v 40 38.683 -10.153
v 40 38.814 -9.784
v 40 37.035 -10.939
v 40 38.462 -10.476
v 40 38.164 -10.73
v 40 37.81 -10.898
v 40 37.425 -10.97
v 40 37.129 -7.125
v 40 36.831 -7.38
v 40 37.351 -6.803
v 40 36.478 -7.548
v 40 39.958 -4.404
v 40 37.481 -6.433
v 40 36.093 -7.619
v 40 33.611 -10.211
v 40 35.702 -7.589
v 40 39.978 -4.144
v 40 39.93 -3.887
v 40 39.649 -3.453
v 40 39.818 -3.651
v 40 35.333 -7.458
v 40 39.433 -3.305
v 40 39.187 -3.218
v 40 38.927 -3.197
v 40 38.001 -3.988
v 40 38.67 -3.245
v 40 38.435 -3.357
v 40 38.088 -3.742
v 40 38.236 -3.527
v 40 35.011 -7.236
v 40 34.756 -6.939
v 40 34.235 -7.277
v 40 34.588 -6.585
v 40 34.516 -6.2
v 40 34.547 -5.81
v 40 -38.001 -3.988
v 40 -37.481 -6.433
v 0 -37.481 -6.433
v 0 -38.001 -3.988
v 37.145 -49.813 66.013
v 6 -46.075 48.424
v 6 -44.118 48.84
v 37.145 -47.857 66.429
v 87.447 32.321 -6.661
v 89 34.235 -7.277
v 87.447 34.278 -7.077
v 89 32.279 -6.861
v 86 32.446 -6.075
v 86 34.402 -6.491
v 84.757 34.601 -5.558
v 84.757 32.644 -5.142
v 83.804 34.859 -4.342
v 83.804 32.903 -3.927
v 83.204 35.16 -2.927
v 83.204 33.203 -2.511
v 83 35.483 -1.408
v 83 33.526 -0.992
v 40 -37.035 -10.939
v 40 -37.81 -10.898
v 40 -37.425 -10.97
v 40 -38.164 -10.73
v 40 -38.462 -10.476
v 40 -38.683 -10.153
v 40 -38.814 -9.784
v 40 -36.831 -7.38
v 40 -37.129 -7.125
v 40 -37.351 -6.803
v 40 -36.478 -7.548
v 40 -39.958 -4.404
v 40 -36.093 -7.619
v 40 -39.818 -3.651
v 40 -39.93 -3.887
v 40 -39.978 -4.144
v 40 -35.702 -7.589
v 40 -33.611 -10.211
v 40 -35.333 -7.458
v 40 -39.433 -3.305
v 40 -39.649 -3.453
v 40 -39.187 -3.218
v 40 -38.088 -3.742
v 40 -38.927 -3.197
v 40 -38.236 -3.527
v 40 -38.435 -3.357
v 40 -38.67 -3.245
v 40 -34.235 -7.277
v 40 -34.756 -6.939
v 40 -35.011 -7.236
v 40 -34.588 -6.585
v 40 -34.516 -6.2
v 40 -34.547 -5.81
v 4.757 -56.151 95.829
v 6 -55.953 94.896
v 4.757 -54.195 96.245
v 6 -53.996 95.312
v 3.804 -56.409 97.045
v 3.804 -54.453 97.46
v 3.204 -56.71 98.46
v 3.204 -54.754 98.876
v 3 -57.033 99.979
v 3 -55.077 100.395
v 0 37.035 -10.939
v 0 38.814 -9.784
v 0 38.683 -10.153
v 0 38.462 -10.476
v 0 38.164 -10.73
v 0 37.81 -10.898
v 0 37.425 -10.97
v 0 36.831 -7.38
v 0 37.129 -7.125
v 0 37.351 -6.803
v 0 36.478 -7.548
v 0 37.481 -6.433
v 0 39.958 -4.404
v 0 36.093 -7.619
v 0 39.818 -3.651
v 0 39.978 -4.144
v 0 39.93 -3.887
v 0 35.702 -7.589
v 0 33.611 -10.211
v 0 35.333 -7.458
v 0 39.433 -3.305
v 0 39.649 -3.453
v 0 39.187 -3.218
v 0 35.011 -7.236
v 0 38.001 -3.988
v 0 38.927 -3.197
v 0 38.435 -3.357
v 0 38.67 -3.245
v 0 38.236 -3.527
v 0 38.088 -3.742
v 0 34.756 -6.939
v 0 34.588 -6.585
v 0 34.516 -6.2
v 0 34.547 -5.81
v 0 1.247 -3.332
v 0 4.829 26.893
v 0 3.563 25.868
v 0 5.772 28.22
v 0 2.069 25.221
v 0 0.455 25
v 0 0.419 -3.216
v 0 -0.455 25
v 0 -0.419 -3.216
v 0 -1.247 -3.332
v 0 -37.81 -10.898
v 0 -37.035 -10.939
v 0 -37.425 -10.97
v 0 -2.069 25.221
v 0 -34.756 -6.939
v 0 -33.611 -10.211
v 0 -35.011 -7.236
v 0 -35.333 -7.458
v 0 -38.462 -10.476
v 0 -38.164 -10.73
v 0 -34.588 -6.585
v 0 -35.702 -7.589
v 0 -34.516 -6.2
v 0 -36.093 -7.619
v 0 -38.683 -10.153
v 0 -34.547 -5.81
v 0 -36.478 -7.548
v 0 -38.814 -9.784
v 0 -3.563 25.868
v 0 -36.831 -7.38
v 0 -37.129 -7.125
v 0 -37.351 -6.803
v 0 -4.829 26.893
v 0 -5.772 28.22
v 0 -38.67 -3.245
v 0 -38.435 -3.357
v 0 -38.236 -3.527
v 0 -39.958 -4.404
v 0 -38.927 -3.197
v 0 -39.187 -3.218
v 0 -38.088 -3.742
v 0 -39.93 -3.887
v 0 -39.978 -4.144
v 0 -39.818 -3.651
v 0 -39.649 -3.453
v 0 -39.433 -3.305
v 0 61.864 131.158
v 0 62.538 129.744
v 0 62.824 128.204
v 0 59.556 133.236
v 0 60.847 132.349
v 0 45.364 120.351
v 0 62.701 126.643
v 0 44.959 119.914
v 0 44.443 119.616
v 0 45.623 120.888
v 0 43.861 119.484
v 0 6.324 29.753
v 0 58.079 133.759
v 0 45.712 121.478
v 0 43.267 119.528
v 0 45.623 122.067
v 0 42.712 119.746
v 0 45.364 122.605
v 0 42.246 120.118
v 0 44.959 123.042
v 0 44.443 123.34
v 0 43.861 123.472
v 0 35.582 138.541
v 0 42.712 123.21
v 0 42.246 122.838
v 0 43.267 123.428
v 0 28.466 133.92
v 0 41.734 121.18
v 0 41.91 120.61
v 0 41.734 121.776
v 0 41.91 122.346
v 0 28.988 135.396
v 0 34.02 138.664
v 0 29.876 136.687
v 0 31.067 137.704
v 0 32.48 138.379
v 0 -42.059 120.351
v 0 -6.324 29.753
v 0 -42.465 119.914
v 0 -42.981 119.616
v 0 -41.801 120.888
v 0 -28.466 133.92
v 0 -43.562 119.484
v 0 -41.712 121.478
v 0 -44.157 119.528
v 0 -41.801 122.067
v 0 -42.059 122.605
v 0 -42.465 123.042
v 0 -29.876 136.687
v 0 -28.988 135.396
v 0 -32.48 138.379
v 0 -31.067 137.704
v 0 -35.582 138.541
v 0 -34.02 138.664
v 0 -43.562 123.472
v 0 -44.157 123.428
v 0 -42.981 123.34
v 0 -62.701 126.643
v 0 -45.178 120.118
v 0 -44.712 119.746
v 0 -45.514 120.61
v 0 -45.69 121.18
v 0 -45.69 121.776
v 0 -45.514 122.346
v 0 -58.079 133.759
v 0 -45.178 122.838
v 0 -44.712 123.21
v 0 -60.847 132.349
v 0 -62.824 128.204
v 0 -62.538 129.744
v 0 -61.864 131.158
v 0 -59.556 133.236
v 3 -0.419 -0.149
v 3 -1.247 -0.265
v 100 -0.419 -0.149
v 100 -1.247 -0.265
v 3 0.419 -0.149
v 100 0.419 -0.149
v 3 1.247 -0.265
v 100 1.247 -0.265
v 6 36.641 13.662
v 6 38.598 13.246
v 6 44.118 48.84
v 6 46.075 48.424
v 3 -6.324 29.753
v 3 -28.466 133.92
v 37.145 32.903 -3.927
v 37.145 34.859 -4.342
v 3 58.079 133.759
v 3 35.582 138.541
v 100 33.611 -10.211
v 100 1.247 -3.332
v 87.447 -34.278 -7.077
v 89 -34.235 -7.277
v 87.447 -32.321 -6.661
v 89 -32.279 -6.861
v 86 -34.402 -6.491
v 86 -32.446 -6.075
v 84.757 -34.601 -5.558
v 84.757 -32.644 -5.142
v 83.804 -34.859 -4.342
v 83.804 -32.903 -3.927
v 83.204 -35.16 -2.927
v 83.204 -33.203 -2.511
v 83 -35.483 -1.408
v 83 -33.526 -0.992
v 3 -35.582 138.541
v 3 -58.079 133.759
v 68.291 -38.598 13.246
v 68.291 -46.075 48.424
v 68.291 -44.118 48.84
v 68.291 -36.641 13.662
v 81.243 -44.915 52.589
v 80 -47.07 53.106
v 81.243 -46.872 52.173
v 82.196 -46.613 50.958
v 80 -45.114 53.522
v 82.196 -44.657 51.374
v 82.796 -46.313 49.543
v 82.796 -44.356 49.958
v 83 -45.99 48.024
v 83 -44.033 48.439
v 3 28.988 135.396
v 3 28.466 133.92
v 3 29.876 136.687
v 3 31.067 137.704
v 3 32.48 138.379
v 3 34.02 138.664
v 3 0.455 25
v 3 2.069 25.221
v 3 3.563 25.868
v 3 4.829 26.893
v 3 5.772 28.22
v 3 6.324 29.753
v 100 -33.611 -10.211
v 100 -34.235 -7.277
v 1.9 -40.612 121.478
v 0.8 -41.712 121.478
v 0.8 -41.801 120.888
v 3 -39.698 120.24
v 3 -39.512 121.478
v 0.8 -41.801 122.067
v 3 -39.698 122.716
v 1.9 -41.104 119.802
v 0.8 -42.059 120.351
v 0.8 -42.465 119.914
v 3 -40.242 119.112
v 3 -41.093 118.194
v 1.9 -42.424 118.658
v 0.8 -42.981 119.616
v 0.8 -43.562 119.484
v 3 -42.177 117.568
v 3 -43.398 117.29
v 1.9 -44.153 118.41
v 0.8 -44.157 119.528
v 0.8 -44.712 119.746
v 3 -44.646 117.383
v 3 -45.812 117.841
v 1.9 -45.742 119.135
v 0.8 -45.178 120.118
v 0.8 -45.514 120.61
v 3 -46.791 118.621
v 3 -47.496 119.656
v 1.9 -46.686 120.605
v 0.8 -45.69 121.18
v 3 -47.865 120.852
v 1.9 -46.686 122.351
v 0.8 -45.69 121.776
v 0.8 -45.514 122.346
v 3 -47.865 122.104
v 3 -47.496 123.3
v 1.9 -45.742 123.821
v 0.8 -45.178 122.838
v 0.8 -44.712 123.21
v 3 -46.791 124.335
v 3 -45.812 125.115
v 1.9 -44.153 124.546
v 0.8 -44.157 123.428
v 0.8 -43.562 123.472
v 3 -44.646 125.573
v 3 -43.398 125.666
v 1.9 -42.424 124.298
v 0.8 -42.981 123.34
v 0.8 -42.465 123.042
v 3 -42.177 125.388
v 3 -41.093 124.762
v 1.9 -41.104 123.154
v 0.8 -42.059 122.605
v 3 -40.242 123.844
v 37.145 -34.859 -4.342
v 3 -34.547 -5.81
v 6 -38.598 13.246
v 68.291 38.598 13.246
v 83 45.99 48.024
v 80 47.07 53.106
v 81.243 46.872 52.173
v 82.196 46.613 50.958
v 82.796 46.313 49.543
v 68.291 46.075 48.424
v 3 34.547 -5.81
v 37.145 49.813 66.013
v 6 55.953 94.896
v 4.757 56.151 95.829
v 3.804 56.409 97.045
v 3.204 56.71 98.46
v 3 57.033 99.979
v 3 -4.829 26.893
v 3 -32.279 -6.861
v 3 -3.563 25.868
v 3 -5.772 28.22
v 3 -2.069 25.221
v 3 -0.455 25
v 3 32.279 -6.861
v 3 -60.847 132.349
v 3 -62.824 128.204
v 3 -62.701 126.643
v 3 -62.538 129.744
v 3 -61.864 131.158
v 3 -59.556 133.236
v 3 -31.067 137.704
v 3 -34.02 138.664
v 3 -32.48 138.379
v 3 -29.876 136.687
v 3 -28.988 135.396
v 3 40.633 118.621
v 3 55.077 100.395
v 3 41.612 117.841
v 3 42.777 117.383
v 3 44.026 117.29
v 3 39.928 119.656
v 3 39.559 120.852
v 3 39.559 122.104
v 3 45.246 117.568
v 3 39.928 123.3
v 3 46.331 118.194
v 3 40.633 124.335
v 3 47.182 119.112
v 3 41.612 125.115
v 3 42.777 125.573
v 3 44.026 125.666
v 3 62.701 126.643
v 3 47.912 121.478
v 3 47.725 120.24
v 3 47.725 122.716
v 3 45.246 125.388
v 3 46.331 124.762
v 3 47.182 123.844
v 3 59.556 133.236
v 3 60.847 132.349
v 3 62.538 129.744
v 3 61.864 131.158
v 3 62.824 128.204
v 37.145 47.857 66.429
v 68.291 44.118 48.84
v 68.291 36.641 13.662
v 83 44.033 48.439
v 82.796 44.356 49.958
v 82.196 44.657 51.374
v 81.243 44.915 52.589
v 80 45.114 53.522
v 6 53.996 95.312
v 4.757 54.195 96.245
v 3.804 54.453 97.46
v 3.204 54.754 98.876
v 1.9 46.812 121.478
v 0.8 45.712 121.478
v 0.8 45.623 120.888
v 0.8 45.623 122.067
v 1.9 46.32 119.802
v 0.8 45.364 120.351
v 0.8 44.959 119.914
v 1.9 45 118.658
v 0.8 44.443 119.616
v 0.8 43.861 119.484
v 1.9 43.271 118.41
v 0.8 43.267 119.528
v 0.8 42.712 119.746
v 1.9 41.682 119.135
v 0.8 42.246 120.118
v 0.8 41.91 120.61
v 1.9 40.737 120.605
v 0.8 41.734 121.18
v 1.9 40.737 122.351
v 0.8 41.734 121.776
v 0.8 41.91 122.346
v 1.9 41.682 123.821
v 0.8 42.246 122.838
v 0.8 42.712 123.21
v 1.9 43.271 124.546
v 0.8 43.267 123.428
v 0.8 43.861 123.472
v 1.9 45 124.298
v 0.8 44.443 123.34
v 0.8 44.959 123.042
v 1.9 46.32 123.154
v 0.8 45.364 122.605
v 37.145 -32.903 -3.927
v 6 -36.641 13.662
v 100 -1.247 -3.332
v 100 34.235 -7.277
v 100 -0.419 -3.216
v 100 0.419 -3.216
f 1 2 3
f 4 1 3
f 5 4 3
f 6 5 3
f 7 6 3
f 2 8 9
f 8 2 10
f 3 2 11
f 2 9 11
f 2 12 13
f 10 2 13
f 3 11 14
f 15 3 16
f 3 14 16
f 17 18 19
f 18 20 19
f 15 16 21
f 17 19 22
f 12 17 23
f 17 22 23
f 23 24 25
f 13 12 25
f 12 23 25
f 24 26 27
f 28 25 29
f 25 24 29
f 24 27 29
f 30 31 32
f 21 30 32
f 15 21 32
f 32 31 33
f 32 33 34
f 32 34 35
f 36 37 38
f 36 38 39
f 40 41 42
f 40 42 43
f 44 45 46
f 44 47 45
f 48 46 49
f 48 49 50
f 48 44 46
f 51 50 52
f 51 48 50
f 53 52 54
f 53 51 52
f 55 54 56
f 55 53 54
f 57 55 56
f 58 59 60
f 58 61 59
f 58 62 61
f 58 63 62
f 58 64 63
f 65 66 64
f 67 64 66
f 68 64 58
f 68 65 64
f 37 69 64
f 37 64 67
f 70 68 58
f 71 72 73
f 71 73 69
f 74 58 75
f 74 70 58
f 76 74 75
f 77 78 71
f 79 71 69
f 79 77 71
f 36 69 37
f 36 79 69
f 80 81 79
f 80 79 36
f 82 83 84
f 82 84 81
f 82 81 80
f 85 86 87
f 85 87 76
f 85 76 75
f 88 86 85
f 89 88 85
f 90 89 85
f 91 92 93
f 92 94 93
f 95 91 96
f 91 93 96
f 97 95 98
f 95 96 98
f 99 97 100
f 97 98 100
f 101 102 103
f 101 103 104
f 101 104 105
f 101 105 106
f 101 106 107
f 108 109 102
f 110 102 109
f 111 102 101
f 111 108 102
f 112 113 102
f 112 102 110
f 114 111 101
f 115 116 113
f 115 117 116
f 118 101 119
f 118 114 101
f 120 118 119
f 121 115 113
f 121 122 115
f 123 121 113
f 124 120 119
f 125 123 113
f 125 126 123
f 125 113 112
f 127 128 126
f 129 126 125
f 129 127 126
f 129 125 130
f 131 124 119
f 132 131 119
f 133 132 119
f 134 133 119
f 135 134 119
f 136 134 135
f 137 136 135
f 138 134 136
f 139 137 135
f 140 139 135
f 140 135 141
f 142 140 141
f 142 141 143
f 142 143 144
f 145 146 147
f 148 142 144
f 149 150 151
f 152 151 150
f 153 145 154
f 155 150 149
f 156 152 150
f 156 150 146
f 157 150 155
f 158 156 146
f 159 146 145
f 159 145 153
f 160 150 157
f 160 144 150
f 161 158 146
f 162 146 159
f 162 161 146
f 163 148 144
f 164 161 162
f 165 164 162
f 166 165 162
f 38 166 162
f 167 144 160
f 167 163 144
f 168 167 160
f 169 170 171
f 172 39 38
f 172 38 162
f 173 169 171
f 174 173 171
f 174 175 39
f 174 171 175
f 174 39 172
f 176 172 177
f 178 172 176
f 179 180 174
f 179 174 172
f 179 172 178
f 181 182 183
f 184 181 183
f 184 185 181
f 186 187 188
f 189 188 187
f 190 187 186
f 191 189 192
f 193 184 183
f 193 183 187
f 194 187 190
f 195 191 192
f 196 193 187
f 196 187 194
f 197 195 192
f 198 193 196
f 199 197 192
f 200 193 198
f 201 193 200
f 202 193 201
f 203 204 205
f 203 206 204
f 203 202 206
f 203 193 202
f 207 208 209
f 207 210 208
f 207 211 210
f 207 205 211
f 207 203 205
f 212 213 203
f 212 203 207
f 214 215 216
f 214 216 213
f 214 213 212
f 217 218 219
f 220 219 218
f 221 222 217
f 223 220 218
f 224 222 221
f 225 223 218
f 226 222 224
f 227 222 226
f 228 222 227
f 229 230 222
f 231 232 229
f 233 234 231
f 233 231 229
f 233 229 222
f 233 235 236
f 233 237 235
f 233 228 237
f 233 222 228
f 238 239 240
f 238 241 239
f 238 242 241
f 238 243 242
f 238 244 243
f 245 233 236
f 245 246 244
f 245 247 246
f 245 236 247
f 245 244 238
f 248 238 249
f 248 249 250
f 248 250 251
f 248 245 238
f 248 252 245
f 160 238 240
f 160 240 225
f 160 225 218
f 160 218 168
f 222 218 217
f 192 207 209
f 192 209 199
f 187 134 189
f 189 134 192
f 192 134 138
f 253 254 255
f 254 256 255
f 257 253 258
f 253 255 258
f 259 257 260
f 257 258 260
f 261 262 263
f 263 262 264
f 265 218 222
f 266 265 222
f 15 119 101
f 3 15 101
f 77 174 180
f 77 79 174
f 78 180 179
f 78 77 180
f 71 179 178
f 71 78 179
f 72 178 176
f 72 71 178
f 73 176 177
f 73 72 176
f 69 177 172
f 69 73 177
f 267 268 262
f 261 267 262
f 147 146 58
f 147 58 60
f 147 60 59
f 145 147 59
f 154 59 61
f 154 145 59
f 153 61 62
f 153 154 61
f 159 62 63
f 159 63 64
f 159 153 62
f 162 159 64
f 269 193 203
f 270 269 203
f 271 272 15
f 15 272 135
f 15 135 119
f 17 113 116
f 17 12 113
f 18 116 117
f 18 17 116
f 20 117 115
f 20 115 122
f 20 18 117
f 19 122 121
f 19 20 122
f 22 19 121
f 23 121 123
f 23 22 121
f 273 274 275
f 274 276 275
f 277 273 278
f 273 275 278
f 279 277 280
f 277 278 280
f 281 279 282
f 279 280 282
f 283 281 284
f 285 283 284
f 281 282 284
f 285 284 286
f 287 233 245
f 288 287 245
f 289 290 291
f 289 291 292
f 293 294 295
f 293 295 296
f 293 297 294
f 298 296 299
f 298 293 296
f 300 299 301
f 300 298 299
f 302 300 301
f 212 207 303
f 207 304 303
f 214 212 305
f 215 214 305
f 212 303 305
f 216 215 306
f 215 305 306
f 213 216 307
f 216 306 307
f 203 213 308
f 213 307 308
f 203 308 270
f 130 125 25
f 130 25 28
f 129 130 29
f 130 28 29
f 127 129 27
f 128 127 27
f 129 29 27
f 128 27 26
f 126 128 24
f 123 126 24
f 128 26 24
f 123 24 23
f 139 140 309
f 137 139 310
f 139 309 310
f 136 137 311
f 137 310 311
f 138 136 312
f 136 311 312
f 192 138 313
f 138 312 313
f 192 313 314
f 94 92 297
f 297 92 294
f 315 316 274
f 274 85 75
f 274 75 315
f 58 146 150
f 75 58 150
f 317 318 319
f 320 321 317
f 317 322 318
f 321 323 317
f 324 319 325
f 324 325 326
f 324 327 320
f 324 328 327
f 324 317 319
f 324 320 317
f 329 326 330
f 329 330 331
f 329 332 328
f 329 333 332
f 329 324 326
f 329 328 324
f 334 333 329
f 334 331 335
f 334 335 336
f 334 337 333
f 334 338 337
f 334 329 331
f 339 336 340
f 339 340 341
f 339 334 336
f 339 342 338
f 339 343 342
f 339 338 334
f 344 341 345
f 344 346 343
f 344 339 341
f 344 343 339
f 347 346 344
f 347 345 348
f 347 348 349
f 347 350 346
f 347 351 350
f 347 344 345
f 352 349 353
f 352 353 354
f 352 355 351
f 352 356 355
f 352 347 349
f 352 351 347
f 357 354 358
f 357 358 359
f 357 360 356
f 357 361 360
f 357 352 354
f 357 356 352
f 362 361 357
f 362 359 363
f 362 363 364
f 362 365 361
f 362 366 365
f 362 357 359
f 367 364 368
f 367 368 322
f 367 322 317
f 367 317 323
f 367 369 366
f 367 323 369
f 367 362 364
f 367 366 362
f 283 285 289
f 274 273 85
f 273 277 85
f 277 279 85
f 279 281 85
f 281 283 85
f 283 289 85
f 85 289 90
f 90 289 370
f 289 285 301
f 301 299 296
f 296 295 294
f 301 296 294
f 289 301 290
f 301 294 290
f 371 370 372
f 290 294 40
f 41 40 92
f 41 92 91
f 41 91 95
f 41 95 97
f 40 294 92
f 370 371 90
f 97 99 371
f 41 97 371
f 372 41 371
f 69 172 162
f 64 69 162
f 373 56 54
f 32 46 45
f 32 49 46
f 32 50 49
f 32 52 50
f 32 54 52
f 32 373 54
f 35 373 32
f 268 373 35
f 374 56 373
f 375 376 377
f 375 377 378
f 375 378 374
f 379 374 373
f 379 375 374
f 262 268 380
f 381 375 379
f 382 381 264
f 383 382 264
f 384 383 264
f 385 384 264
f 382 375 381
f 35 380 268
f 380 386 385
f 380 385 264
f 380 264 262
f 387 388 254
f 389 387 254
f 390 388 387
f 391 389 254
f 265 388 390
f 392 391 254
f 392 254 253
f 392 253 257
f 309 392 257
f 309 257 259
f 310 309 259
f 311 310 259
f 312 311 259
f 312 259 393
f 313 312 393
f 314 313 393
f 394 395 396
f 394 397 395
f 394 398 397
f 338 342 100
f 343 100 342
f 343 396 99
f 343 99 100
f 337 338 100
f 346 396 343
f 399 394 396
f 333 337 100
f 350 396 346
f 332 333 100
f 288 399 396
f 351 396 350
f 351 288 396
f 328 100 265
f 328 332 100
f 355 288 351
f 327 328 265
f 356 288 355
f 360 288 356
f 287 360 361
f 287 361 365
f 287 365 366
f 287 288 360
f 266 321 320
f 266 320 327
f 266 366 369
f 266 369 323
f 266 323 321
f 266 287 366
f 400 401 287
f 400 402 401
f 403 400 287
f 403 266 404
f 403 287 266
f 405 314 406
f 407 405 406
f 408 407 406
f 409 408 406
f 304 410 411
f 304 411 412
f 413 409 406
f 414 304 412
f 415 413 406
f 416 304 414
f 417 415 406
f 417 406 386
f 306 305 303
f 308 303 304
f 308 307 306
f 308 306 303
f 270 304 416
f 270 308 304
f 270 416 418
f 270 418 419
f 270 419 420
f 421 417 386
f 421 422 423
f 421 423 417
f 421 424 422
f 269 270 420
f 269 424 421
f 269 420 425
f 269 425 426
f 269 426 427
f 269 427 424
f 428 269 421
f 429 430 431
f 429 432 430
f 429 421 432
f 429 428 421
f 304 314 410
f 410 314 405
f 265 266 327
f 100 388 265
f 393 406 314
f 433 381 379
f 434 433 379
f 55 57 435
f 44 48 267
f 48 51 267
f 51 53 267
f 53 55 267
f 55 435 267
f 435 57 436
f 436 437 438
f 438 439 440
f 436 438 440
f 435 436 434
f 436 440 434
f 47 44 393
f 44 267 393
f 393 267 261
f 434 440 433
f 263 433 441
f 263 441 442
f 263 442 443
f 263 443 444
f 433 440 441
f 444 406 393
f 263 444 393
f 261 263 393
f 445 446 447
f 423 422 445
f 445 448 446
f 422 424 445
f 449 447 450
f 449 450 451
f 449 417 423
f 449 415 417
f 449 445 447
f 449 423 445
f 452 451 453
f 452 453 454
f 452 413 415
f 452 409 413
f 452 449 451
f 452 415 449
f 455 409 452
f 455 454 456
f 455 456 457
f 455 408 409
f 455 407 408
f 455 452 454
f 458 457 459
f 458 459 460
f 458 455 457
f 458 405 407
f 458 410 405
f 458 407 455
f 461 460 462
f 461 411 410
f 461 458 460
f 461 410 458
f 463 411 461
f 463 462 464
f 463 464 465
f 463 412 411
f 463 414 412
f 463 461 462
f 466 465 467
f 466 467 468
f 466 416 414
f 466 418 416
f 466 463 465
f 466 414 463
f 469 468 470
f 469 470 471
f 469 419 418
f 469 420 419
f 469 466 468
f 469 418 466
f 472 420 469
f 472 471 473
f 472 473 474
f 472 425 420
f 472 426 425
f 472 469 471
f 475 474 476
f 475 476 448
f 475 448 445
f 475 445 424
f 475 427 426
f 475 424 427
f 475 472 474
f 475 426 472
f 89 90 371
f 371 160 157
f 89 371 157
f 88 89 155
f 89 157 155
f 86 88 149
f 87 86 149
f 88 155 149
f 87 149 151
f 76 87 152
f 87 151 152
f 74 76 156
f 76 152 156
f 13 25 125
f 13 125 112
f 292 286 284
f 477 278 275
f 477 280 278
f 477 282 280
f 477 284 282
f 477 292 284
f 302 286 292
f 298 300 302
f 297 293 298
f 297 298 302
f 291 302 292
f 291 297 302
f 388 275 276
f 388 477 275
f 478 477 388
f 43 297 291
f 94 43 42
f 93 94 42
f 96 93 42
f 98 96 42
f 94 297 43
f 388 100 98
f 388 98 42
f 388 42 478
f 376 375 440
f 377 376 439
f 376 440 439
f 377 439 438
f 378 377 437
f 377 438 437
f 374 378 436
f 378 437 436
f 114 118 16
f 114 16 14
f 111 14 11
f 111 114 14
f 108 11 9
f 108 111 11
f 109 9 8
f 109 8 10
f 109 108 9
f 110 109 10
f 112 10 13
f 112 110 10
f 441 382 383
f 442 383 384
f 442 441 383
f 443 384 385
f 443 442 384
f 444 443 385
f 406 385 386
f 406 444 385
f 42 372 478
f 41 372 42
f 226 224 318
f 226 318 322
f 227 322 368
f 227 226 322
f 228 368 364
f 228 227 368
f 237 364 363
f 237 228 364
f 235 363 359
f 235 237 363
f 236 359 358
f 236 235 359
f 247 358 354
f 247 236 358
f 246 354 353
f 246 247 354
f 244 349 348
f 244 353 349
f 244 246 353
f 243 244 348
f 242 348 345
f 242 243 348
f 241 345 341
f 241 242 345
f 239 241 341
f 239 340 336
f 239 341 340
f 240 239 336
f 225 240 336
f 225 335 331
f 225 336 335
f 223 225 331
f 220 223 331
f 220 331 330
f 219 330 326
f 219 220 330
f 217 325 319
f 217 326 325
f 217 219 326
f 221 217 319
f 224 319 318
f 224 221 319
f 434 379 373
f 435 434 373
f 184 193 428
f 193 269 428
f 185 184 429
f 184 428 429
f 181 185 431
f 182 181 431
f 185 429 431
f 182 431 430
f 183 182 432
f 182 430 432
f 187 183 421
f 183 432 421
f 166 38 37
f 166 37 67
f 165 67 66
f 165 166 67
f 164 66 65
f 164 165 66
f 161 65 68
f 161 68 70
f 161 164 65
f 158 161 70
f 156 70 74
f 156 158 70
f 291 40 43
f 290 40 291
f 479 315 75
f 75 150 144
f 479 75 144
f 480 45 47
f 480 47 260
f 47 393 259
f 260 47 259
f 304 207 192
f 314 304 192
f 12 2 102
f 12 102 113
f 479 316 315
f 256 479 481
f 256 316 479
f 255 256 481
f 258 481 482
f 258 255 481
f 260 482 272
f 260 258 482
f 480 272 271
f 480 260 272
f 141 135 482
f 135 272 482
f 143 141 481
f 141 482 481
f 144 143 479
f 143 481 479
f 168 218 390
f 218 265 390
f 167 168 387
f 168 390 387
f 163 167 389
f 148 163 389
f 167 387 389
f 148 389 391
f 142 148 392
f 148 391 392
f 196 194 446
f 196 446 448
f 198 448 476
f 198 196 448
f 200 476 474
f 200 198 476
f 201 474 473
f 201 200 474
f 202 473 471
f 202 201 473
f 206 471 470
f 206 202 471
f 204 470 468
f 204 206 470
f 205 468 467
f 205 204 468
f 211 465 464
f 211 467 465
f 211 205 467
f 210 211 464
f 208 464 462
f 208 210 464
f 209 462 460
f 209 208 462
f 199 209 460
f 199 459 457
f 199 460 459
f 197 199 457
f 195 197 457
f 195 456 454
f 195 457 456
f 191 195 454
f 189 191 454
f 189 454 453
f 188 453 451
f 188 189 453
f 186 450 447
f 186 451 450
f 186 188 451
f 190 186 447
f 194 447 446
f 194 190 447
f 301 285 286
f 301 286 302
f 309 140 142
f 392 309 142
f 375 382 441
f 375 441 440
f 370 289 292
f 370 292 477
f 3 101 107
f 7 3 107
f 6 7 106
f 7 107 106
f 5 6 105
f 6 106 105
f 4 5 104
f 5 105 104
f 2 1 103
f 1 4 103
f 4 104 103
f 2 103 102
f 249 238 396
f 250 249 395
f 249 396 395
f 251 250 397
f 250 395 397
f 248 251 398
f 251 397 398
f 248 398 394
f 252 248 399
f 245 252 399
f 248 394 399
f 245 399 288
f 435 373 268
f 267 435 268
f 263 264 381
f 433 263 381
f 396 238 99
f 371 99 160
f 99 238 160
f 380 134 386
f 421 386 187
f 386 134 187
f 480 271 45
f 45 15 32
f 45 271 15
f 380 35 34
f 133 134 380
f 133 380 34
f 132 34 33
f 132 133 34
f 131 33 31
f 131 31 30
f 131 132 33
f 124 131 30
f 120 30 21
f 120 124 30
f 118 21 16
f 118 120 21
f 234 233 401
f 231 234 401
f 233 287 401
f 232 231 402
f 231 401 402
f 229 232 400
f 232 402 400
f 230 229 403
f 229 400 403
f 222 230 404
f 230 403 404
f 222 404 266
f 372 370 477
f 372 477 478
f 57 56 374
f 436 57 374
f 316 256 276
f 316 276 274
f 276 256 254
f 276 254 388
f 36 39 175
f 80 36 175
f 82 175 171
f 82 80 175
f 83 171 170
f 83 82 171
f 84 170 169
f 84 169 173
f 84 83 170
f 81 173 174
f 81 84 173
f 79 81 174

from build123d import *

# Parameters (mm, degrees)
F1_DEPTH     = 100
F0_R         = 2
F2_DEPTH     = 3
F3_DEPTH     = 40
F4_W         = 80
F4_H         = 60
F5_DEPTH     = 2
F7_DEPTH     = 25
F9_R         = 6
F10_T1_DEPTH = 40
F10_T3_DEPTH = 47.5
F11_R        = 0.99999
F12_SIZE     = 2.2


# Not quite as in the source:
# - a fillet or chamfer that OpenCascade refuses, or shapes differently, is made with other operations: its cross-section is extruded or revolved along the edge and cut away or added
# - a fillet or chamfer is up to 0.001 mm smaller than in the source, because OpenCascade refuses the exact size


with BuildPart() as f1:
    # F0 (on Right) → F1 (new body)
    with BuildSketch(Plane.YZ):
        Polygon((34.2351660257, -7.2769091786), (0, 0), (-34.2351660257, -7.2769091786), (-33.6114309532, -10.2113519808), (0, -3.0670217846), (33.6114309532, -10.2113519808), align=None)
    extrude(amount=F1_DEPTH)

    # F0 (on Right) → F2 (join)
    with BuildSketch(Plane.YZ):
        Polygon((5.3139140418, 25), (0, 0), (34.2351660257, -7.2769091786), (63.9481604091, 132.5117388406), (29.7129943835, 139.7886480192), align=None)
        with Locations((43.711902034, 121.4779794189)):
            Circle(F0_R, mode=Mode.SUBTRACT)
        Polygon((-5.3139140418, 25), (0, 0), (5.3139140418, 25), align=None)
        Polygon((-34.2351660257, -7.2769091786), (0, 0), (-5.3139140418, 25), (-29.7129943835, 139.7886480192), (-63.9481604091, 132.5117388406), align=None)
        with Locations((-43.711902034, 121.4779794189)):
            Circle(F0_R, mode=Mode.SUBTRACT)
    extrude(amount=F2_DEPTH)

    # F0 (on Right) → F3 (join)
    with BuildSketch(Plane.YZ):
        Polygon((-33.6114309532, -10.2113519808), (-34.2351660257, -7.2769091786), (-37.1696088279, -7.9006442511), (-38.209167282, -3.0099062474), (-40.1654624834, -3.425729629), (-38.5021689569, -11.2509104349), align=None)
        Polygon((37.1696088279, -7.9006442511), (34.2351660257, -7.2769091786), (33.6114309532, -10.2113519808), (38.5021689569, -11.2509104349), (40.1654624834, -3.425729629), (38.209167282, -3.0099062474), align=None)
    extrude(amount=F3_DEPTH)

    # F4 (on face) → F5 (join)
    with BuildSketch(Plane(origin=(0, 34.2351660257, -7.2769091786), x_dir=(-1, 0, 0), z_dir=(0, 0.9781476007, -0.2079116908))):
        Polygon((-3, 106.1880215352), (-83, 60), (-3, 60), align=None)
        with Locations((-43, 30)):
            Rectangle(F4_W, F4_H)
    extrude(amount=-F5_DEPTH)

    # F6 (on face) → F7 (cut)
    with BuildSketch(Plane(origin=(0, 34.2351660257, -7.2769091786), x_dir=(-1, 0, 0), z_dir=(0, 0.9781476007, -0.2079116908))):
        Polygon((-68.2907584126, 20.9817930688), (-37.1453792063, 3), (-6, 20.9817930688), (-6, 56.9453792063), (-37.1453792063, 74.927172275), (-68.2907584126, 56.9453792063), align=None)
    extrude(amount=-F7_DEPTH, mode=Mode.SUBTRACT)

    # F8: F1 across plane


with BuildPart() as f1_1:
    add(f1.part)
    add(f1.part.mirror(Plane.XZ))

    # F9
    f9_edges = [f1_1.edges().sort_by_distance(p)[0] for p in [
        (3, -55.33475, 96.798561),
        (3, 55.33475, 96.798561),
        (83, -45.73172, 51.619859),
        (83, 45.73172, 51.619859),
        (83, -33.257018, -7.068997),
        (83, 33.257018, -7.068997),
        (1.5, -5.313914, 25),
        (1.5, 5.313914, 25),
        (51.5, 0, 0),
        (50, 0, -3.067022),
        (1.5, -29.712994, 139.788648),
        (1.5, -63.94816, 132.511739),
        (1.5, 29.712994, 139.788648),
        (1.5, 63.94816, 132.511739),
    ]]
    fillet(f9_edges, radius=F9_R)

    # F10: fillet of radius 1.5 on 6 edges, made by hand

    # F10_s2 → F10_t1 (join)
    with BuildSketch(Plane.YZ):
        with BuildLine():
            ThreePointArc((34.5470335619, -5.8096877775), (34.7562491111, -6.9385138663), (35.7023874268, -7.5887767148))
            Line((35.7023874268, -7.5887767148), (34.2351660257, -7.2769091786))
            Line((34.2351660257, -7.2769091786), (34.5470335619, -5.8096877775))
        make_face()
        with BuildLine():
            ThreePointArc((35.7023874268, -7.5887767148), (36.8312135155, -7.3795611657), (37.4814763641, -6.43342285))
            Line((37.4814763641, -6.43342285), (37.1696088279, -7.9006442511))
            Line((37.1696088279, -7.9006442511), (35.7023874268, -7.5887767148))
        make_face()
        with BuildLine():
            ThreePointArc((-37.4814763641, -6.43342285), (-36.8312135155, -7.3795611657), (-35.7023874268, -7.5887767148))
            Line((-35.7023874268, -7.5887767148), (-37.1696088279, -7.9006442511))
            Line((-37.1696088279, -7.9006442511), (-37.4814763641, -6.43342285))
        make_face()
        with BuildLine():
            ThreePointArc((-34.5470335619, -5.8096877775), (-34.7562491111, -6.9385138663), (-35.7023874268, -7.5887767148))
            Line((-35.7023874268, -7.5887767148), (-34.2351660257, -7.2769091786))
            Line((-34.2351660257, -7.2769091786), (-34.5470335619, -5.8096877775))
        make_face()
    extrude(amount=F10_T1_DEPTH)

    # F10_s4 → F10_t3 (cut)
    with BuildSketch(Plane.YZ.offset(-3.75)):
        with BuildLine():
            ThreePointArc((-37.0349475558, -10.9390428987), (-38.1637736445, -10.7298273495), (-38.8140364931, -9.7836890338))
            Line((-38.8140364931, -9.7836890338), (-38.5021689569, -11.2509104349))
            Line((-38.5021689569, -11.2509104349), (-37.0349475558, -10.9390428987))
        make_face()
        with BuildLine():
            ThreePointArc((37.0349475558, -10.9390428987), (38.1637736445, -10.7298273495), (38.8140364931, -9.7836890338))
            Line((38.8140364931, -9.7836890338), (38.5021689569, -11.2509104349))
            Line((38.5021689569, -11.2509104349), (37.0349475558, -10.9390428987))
        make_face()
    extrude(amount=F10_T3_DEPTH, mode=Mode.SUBTRACT)

    # F11 (radius 1 in the source; OpenCascade refuses exactly that, so slightly less here)
    f11_edges = [f1_1.edges().sort_by_distance(p)[0] for p in [
        (20, 40.165462, -3.42573),
        (20, 38.209167, -3.009906),
        (20, -40.165462, -3.42573),
        (20, -38.209167, -3.009906),
    ]]
    fillet(f11_edges, radius=F11_R)

    # F12
    f12_edges = [f1_1.edges().sort_by_distance(p)[0] for p in [
        (3, -45.711902, 121.477979),
        (3, 41.711902, 121.477979),
    ]]
    chamfer(f12_edges, length=F12_SIZE)


solid = f1_1.part
